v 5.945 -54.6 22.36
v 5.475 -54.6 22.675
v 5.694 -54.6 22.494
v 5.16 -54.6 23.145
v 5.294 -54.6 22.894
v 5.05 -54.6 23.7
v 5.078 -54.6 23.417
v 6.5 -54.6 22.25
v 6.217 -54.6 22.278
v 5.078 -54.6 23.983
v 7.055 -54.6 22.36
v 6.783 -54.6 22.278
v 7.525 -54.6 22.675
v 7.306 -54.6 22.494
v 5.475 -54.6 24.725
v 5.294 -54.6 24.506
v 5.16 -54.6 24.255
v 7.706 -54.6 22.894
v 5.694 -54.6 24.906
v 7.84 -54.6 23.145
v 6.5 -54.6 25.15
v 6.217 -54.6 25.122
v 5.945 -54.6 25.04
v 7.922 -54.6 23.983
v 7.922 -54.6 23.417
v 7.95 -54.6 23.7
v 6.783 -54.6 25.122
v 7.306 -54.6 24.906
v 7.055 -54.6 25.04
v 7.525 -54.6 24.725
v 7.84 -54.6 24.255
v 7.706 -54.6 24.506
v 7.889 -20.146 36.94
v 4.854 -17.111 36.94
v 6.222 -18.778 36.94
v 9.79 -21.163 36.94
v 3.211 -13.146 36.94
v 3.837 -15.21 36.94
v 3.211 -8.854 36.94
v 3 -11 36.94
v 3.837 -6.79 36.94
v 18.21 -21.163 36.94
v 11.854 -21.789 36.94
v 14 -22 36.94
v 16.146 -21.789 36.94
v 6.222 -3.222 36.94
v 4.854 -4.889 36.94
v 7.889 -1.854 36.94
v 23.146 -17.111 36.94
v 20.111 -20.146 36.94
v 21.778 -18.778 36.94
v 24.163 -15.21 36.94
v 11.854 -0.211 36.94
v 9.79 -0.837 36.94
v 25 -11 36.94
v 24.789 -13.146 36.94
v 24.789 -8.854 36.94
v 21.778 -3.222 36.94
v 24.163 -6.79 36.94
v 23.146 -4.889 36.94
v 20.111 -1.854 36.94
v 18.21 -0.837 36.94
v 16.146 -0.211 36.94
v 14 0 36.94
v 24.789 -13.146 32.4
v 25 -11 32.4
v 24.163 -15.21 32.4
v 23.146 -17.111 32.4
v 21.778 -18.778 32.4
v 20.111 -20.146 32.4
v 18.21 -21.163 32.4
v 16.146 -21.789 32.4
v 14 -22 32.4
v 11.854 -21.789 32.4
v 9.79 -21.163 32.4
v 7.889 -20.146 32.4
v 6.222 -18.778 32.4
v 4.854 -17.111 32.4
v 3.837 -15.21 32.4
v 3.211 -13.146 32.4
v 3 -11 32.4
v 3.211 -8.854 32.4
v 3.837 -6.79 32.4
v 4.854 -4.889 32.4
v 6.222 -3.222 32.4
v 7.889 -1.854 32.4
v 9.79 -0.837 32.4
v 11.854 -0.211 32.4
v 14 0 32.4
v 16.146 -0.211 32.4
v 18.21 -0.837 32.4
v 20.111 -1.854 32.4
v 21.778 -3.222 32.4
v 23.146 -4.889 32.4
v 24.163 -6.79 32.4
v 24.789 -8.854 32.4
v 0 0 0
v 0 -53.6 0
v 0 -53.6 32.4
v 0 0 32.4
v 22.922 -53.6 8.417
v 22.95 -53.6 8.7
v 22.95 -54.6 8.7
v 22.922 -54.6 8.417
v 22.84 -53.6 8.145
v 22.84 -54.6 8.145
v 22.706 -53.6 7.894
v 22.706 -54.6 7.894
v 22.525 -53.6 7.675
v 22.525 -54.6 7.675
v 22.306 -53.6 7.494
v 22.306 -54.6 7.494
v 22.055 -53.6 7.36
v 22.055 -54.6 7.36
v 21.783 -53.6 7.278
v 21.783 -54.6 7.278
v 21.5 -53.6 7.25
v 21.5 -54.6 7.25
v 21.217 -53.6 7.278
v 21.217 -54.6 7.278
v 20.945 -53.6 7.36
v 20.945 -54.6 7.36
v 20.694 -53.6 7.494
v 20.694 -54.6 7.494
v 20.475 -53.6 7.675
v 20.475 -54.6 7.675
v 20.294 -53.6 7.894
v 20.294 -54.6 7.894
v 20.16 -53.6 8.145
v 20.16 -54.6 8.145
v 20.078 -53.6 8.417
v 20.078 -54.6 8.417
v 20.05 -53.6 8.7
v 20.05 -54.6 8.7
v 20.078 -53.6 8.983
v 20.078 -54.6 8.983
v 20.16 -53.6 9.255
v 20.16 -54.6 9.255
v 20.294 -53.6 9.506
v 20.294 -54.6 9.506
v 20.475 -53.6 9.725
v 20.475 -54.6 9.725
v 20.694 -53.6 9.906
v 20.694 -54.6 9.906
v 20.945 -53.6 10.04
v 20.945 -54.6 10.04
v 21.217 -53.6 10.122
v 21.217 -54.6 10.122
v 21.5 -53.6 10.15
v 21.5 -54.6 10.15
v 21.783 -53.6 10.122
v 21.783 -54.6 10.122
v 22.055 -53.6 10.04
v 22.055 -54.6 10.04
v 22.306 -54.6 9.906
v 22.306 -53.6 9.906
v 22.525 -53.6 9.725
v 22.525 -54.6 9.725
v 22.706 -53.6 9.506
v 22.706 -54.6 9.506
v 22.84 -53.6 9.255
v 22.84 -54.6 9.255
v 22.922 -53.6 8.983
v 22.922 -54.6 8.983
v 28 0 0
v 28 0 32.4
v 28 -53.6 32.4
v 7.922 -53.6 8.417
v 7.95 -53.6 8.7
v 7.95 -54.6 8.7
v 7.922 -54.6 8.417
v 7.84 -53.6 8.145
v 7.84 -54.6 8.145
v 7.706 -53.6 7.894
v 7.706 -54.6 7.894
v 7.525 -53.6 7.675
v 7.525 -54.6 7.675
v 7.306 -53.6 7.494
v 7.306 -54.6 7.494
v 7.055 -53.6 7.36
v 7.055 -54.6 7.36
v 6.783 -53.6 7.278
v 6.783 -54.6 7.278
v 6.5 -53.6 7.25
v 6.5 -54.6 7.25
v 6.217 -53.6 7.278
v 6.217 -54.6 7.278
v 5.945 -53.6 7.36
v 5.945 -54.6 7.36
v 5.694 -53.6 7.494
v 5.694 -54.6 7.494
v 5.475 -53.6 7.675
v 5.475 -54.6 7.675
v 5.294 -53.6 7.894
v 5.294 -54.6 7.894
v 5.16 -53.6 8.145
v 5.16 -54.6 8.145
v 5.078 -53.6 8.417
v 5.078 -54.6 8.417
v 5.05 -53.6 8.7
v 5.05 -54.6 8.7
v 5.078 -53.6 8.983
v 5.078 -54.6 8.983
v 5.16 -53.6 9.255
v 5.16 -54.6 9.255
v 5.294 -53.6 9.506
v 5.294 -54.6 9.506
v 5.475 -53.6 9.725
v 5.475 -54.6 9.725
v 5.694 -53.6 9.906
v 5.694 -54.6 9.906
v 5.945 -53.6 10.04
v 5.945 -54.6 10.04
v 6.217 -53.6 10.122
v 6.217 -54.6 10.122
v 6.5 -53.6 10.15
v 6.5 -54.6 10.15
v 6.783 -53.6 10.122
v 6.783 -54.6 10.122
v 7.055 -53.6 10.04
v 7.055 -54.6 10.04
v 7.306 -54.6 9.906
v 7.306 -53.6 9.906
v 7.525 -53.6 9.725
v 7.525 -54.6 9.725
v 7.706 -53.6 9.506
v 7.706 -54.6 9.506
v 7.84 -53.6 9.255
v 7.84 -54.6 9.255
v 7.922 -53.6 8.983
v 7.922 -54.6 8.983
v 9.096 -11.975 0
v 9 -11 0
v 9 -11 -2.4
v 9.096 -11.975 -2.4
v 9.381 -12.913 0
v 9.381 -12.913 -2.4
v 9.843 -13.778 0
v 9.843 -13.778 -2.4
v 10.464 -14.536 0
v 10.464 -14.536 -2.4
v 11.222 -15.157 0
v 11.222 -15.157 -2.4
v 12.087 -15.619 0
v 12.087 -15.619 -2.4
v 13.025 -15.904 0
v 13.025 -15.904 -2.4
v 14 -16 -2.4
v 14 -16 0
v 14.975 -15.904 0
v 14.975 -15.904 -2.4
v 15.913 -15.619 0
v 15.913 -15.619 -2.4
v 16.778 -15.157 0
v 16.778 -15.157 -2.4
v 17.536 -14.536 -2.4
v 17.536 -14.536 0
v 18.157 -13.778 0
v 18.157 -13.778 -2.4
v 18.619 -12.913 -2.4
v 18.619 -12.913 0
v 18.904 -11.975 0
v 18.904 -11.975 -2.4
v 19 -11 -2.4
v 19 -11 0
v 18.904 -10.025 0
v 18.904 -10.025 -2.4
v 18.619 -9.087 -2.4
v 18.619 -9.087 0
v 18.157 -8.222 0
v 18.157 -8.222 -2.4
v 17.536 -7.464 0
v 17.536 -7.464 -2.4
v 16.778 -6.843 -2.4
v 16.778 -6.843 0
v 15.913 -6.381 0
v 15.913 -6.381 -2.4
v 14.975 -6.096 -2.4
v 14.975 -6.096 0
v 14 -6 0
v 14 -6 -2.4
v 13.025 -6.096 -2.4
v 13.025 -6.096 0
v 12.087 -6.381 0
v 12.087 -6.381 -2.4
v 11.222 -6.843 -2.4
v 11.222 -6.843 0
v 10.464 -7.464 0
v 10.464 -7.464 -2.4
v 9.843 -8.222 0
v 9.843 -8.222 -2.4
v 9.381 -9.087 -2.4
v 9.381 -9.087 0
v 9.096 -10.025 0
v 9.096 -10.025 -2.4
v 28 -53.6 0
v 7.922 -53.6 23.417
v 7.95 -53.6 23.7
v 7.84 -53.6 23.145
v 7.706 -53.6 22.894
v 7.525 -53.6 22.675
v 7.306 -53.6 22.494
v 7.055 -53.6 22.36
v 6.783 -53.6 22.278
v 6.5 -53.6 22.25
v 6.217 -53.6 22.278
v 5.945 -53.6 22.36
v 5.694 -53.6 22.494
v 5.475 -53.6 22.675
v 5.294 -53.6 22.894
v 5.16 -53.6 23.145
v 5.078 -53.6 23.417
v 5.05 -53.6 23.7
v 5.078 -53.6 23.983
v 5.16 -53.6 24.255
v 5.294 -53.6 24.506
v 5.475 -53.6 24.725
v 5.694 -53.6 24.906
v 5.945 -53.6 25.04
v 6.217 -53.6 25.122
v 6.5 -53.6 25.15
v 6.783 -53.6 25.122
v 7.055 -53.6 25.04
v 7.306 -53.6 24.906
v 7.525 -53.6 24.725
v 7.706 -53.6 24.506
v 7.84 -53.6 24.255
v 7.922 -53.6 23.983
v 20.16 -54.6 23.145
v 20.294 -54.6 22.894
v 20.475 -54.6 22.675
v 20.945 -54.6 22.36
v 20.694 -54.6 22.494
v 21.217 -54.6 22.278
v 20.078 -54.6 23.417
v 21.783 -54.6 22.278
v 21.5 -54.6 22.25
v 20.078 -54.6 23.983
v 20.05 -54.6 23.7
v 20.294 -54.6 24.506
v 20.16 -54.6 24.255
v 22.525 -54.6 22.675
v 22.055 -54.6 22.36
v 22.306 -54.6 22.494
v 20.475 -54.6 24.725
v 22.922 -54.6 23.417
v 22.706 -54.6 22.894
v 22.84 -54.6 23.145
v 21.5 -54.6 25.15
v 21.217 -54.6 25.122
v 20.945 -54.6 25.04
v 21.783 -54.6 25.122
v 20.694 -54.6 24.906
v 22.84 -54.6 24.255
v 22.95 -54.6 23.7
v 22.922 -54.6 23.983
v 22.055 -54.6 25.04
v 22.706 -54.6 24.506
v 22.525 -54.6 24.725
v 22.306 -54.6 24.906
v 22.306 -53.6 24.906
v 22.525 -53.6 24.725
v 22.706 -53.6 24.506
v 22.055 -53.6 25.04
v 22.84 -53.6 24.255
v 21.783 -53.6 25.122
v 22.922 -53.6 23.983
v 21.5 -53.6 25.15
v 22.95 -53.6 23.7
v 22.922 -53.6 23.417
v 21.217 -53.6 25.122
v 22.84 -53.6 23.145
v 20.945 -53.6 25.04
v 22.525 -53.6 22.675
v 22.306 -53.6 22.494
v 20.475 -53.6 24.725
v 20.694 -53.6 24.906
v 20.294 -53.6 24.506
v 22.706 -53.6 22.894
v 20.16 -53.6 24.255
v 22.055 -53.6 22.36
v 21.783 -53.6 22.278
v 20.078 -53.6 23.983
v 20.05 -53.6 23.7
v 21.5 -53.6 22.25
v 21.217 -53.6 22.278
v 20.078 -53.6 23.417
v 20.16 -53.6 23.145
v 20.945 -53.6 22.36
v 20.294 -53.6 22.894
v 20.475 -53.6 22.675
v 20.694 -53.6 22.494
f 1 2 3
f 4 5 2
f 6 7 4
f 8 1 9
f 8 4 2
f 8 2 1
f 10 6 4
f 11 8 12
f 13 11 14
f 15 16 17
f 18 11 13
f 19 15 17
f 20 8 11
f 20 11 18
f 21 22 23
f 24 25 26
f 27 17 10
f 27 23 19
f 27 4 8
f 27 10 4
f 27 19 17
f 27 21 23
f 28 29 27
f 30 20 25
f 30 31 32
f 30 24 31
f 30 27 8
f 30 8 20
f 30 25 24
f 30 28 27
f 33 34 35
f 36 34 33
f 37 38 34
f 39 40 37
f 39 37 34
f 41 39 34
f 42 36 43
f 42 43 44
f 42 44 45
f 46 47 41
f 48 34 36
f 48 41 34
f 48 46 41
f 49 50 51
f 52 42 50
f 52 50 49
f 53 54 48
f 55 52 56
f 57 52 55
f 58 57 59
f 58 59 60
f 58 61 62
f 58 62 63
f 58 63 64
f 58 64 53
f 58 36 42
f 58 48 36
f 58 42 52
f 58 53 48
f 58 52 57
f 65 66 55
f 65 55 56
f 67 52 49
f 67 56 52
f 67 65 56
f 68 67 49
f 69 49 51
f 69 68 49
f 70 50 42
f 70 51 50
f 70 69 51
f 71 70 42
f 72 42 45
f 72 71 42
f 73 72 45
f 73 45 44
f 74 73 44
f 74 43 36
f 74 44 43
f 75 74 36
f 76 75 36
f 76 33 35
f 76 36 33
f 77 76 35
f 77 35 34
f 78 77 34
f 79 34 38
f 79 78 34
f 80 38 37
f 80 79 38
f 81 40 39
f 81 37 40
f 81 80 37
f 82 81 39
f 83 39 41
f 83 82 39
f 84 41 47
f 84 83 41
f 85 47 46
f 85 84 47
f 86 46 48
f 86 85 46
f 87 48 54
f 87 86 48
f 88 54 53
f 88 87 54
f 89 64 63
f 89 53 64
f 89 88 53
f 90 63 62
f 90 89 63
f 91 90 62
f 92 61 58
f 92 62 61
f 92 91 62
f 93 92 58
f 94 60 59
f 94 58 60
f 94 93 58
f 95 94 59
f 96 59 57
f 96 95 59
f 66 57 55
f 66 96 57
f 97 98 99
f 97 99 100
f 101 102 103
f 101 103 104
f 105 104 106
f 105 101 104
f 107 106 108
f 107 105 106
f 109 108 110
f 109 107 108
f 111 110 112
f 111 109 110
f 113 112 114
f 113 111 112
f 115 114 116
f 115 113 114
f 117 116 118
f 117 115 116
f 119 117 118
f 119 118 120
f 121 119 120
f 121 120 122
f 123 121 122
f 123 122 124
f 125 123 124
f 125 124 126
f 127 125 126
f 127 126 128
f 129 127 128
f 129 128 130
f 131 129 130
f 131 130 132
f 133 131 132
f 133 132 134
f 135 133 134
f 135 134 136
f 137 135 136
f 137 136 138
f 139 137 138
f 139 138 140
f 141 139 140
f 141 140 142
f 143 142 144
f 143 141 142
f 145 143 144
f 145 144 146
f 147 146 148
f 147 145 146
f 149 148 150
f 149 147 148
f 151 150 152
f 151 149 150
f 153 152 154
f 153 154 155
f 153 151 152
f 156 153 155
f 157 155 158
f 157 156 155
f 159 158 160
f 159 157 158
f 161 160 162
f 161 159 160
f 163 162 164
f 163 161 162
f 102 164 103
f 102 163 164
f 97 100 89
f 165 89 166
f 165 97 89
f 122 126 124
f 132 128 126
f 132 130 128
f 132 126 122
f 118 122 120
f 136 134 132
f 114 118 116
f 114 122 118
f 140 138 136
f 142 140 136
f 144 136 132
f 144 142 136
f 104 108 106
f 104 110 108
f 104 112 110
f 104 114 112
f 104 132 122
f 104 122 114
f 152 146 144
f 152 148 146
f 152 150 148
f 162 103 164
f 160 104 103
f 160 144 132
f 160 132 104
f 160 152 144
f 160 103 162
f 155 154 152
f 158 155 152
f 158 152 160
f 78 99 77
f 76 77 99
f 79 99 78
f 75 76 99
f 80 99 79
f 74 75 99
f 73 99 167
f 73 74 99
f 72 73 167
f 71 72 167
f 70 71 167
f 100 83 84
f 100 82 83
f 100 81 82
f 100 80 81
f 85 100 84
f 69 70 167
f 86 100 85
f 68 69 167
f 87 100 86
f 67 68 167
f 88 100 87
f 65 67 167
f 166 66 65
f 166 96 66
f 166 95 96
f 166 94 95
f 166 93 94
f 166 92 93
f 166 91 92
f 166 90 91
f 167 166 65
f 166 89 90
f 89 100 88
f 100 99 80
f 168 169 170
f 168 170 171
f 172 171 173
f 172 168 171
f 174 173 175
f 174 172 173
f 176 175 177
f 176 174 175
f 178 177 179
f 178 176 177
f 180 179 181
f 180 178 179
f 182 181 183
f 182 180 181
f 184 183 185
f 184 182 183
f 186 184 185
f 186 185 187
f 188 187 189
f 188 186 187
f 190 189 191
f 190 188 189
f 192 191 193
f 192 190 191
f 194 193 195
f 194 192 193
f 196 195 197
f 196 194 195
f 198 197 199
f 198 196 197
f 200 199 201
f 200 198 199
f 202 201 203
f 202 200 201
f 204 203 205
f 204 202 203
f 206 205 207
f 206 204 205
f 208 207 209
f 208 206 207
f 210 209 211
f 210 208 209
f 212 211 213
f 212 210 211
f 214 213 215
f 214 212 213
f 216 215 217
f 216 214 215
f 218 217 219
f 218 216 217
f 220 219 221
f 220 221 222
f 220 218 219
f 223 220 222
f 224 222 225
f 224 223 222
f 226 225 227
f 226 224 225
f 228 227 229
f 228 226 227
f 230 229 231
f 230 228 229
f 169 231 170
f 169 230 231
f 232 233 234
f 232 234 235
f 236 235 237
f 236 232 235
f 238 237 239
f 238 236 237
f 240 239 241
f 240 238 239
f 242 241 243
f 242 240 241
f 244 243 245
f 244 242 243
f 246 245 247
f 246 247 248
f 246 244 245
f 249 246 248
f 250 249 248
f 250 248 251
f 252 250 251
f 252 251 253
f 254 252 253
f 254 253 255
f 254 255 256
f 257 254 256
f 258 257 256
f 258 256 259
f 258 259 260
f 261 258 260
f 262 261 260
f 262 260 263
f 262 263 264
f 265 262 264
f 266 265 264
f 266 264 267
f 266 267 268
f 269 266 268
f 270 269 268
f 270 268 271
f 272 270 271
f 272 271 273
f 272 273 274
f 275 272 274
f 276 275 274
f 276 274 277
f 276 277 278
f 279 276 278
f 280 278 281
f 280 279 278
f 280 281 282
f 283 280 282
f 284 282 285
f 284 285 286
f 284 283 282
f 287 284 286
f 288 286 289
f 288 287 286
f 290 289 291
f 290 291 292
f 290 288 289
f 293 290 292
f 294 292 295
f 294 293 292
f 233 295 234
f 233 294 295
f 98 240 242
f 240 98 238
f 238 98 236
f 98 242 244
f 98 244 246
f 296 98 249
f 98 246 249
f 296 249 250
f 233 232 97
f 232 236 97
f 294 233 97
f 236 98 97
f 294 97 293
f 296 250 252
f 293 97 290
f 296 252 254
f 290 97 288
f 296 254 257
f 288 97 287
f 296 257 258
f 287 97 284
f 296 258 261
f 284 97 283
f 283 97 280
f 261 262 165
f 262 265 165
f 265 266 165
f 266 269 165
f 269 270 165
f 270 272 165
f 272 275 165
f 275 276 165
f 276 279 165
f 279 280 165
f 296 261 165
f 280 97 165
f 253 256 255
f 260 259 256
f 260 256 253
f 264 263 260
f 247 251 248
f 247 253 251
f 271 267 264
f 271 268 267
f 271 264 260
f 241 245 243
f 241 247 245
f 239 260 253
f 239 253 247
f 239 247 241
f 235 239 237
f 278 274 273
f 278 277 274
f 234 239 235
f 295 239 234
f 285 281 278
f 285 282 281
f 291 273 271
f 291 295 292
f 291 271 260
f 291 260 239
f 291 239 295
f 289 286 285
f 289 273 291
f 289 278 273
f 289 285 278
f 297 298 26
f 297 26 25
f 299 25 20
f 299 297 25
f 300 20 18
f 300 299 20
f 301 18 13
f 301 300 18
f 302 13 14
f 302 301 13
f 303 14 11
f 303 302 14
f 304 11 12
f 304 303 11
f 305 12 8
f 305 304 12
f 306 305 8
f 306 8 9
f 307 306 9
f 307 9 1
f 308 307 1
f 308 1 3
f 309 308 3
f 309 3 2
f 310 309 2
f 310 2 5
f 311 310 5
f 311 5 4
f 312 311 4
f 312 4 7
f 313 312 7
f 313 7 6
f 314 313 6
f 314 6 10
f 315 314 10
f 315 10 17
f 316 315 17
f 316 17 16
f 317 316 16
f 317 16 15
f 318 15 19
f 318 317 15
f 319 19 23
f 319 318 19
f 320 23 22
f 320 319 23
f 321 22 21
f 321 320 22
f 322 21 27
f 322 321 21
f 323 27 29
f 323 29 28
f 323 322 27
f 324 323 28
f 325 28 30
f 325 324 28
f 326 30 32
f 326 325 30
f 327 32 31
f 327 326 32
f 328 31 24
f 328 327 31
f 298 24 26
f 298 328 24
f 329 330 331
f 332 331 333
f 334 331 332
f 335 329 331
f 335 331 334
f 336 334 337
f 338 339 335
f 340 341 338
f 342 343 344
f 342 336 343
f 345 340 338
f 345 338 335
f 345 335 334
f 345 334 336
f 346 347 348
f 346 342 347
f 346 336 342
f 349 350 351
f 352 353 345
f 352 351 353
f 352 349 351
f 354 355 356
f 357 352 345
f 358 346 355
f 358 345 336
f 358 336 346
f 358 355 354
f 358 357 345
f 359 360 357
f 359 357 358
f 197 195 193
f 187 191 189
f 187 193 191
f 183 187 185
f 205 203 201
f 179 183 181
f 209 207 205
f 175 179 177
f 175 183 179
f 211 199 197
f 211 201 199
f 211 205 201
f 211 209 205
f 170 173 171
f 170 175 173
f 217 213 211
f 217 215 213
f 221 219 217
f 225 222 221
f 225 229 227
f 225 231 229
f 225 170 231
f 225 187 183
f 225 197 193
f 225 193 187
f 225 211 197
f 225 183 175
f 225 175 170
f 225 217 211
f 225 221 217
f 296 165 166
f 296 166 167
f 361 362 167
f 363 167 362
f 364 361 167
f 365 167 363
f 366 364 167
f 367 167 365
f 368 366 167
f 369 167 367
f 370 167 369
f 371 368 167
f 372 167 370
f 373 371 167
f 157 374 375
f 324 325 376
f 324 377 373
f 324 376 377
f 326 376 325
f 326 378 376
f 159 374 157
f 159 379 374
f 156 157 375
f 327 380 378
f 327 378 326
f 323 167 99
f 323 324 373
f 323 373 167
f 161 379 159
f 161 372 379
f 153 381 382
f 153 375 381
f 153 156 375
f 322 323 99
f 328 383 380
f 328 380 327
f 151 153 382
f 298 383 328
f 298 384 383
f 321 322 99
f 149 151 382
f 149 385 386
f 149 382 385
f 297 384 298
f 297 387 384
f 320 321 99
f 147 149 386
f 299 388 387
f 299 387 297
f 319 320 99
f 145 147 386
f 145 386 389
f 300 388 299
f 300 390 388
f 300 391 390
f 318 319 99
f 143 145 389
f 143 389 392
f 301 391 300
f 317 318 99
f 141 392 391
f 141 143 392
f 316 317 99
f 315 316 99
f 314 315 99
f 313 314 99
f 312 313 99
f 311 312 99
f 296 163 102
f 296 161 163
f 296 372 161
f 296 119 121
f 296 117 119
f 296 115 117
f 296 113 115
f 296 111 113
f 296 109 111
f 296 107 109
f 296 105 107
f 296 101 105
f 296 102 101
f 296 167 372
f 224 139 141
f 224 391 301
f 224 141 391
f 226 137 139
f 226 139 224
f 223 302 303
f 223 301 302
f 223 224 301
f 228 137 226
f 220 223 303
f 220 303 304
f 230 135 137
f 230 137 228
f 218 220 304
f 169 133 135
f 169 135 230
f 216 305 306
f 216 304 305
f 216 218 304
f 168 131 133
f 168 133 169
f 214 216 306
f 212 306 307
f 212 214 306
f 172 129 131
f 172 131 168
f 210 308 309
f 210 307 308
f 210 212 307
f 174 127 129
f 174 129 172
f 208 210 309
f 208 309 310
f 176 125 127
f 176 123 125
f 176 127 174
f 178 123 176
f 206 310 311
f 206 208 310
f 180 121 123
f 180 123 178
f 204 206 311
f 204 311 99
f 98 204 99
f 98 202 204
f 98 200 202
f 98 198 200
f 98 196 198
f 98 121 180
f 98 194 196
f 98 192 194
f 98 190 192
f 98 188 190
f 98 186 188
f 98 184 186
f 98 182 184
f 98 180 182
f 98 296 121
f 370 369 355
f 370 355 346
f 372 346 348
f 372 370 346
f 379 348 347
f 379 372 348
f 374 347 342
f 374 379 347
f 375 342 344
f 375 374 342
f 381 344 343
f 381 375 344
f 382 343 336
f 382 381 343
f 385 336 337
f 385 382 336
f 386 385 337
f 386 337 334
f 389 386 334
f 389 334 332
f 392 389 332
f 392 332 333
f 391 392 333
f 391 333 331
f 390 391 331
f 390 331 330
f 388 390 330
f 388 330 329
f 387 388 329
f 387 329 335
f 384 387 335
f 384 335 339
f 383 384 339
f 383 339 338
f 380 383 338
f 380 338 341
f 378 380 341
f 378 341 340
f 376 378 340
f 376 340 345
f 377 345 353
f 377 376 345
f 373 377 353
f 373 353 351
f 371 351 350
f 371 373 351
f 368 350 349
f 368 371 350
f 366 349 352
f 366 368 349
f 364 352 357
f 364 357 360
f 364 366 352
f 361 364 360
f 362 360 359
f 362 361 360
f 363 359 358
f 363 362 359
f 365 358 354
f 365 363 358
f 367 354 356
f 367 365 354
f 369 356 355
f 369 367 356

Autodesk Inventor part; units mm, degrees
ref_plane "YZ Plane" through (0, 0, 0) normal (1, 0, 0) x (0, 1, 0)
ref_plane "XZ Plane" through (0, 0, 0) normal (0, 1, 0) x (-1, 0, 0)
ref_plane "XY Plane" through (0, 0, 0) normal (0, 0, 1) x (1, 0, 0)
sketch "Sketch1" plane through (0, 0, 0) normal (0, 0, 1) x (1, 0, 0)
  line L0 (0, 0) -> (28, 0)
  line L1 (28, 0) -> (28, -53.6)
  line L2 (28, -53.6) -> (0, -53.6)
  line L3 (0, -53.6) -> (0, 0)
  dimension "d0" = 28
  dimension "d1" = 53.6
extrude "Extrusion1" add sketch "Sketch1" along normal blind 32.4
sketch "Sketch2" plane through (0, 0, 32.4) normal (0, 0, 1) x (1, 0, 0)
  circle A0 centre (14, -11) radius 11
  dimension "d5" = 22
extrude "Extrusion2" add sketch "Sketch2" along normal blind 4.54
sketch "Sketch3" plane through (0, 0, 0) normal (0, 0, -1) x (-1, 0, 0)
  line L0 (0, 0) -> (-28, 0) projected
  line L1 (0, 0) -> (-14, 0)
  line L2 (-14, 0) -> (-14, -11)
  circle A0 centre (-14, -11) radius 5
  dimension "d8" = 14
  dimension "d9" = 11
  dimension "d10" = 10
extrude "Extrusion3" add sketch "Sketch3" along normal blind 2.4
sketch "Sketch4" plane through (0, -53.6, 0) normal (0, -1, 0) x (1, 0, 0)
  line L0 (0, 0) -> (28, 0) projected
  line L1 (0, 0) -> (0, 32.4) projected
  line L2 (6.5, 23.7) -> (6.5, 8.7)
  line L3 (6.5, 8.7) -> (21.5, 8.7)
  line L4 (21.5, 8.7) -> (21.5, 23.7)
  circle A0 centre (6.5, 23.7) radius 1.45
  circle A1 centre (6.5, 8.7) radius 1.45
  circle A2 centre (21.5, 8.7) radius 1.45
  circle A3 centre (21.5, 23.7) radius 1.45
  dimension "d17" = 15
  dimension "d18" = 15
  dimension "d19" = 2.9
  dimension "d20" = 2.9
  dimension "d21" = 2.9
  dimension "d22" = 2.9
extrude "Extrusion4" add sketch "Sketch4" along normal blind 1
properties part number "ax_18_replace"
